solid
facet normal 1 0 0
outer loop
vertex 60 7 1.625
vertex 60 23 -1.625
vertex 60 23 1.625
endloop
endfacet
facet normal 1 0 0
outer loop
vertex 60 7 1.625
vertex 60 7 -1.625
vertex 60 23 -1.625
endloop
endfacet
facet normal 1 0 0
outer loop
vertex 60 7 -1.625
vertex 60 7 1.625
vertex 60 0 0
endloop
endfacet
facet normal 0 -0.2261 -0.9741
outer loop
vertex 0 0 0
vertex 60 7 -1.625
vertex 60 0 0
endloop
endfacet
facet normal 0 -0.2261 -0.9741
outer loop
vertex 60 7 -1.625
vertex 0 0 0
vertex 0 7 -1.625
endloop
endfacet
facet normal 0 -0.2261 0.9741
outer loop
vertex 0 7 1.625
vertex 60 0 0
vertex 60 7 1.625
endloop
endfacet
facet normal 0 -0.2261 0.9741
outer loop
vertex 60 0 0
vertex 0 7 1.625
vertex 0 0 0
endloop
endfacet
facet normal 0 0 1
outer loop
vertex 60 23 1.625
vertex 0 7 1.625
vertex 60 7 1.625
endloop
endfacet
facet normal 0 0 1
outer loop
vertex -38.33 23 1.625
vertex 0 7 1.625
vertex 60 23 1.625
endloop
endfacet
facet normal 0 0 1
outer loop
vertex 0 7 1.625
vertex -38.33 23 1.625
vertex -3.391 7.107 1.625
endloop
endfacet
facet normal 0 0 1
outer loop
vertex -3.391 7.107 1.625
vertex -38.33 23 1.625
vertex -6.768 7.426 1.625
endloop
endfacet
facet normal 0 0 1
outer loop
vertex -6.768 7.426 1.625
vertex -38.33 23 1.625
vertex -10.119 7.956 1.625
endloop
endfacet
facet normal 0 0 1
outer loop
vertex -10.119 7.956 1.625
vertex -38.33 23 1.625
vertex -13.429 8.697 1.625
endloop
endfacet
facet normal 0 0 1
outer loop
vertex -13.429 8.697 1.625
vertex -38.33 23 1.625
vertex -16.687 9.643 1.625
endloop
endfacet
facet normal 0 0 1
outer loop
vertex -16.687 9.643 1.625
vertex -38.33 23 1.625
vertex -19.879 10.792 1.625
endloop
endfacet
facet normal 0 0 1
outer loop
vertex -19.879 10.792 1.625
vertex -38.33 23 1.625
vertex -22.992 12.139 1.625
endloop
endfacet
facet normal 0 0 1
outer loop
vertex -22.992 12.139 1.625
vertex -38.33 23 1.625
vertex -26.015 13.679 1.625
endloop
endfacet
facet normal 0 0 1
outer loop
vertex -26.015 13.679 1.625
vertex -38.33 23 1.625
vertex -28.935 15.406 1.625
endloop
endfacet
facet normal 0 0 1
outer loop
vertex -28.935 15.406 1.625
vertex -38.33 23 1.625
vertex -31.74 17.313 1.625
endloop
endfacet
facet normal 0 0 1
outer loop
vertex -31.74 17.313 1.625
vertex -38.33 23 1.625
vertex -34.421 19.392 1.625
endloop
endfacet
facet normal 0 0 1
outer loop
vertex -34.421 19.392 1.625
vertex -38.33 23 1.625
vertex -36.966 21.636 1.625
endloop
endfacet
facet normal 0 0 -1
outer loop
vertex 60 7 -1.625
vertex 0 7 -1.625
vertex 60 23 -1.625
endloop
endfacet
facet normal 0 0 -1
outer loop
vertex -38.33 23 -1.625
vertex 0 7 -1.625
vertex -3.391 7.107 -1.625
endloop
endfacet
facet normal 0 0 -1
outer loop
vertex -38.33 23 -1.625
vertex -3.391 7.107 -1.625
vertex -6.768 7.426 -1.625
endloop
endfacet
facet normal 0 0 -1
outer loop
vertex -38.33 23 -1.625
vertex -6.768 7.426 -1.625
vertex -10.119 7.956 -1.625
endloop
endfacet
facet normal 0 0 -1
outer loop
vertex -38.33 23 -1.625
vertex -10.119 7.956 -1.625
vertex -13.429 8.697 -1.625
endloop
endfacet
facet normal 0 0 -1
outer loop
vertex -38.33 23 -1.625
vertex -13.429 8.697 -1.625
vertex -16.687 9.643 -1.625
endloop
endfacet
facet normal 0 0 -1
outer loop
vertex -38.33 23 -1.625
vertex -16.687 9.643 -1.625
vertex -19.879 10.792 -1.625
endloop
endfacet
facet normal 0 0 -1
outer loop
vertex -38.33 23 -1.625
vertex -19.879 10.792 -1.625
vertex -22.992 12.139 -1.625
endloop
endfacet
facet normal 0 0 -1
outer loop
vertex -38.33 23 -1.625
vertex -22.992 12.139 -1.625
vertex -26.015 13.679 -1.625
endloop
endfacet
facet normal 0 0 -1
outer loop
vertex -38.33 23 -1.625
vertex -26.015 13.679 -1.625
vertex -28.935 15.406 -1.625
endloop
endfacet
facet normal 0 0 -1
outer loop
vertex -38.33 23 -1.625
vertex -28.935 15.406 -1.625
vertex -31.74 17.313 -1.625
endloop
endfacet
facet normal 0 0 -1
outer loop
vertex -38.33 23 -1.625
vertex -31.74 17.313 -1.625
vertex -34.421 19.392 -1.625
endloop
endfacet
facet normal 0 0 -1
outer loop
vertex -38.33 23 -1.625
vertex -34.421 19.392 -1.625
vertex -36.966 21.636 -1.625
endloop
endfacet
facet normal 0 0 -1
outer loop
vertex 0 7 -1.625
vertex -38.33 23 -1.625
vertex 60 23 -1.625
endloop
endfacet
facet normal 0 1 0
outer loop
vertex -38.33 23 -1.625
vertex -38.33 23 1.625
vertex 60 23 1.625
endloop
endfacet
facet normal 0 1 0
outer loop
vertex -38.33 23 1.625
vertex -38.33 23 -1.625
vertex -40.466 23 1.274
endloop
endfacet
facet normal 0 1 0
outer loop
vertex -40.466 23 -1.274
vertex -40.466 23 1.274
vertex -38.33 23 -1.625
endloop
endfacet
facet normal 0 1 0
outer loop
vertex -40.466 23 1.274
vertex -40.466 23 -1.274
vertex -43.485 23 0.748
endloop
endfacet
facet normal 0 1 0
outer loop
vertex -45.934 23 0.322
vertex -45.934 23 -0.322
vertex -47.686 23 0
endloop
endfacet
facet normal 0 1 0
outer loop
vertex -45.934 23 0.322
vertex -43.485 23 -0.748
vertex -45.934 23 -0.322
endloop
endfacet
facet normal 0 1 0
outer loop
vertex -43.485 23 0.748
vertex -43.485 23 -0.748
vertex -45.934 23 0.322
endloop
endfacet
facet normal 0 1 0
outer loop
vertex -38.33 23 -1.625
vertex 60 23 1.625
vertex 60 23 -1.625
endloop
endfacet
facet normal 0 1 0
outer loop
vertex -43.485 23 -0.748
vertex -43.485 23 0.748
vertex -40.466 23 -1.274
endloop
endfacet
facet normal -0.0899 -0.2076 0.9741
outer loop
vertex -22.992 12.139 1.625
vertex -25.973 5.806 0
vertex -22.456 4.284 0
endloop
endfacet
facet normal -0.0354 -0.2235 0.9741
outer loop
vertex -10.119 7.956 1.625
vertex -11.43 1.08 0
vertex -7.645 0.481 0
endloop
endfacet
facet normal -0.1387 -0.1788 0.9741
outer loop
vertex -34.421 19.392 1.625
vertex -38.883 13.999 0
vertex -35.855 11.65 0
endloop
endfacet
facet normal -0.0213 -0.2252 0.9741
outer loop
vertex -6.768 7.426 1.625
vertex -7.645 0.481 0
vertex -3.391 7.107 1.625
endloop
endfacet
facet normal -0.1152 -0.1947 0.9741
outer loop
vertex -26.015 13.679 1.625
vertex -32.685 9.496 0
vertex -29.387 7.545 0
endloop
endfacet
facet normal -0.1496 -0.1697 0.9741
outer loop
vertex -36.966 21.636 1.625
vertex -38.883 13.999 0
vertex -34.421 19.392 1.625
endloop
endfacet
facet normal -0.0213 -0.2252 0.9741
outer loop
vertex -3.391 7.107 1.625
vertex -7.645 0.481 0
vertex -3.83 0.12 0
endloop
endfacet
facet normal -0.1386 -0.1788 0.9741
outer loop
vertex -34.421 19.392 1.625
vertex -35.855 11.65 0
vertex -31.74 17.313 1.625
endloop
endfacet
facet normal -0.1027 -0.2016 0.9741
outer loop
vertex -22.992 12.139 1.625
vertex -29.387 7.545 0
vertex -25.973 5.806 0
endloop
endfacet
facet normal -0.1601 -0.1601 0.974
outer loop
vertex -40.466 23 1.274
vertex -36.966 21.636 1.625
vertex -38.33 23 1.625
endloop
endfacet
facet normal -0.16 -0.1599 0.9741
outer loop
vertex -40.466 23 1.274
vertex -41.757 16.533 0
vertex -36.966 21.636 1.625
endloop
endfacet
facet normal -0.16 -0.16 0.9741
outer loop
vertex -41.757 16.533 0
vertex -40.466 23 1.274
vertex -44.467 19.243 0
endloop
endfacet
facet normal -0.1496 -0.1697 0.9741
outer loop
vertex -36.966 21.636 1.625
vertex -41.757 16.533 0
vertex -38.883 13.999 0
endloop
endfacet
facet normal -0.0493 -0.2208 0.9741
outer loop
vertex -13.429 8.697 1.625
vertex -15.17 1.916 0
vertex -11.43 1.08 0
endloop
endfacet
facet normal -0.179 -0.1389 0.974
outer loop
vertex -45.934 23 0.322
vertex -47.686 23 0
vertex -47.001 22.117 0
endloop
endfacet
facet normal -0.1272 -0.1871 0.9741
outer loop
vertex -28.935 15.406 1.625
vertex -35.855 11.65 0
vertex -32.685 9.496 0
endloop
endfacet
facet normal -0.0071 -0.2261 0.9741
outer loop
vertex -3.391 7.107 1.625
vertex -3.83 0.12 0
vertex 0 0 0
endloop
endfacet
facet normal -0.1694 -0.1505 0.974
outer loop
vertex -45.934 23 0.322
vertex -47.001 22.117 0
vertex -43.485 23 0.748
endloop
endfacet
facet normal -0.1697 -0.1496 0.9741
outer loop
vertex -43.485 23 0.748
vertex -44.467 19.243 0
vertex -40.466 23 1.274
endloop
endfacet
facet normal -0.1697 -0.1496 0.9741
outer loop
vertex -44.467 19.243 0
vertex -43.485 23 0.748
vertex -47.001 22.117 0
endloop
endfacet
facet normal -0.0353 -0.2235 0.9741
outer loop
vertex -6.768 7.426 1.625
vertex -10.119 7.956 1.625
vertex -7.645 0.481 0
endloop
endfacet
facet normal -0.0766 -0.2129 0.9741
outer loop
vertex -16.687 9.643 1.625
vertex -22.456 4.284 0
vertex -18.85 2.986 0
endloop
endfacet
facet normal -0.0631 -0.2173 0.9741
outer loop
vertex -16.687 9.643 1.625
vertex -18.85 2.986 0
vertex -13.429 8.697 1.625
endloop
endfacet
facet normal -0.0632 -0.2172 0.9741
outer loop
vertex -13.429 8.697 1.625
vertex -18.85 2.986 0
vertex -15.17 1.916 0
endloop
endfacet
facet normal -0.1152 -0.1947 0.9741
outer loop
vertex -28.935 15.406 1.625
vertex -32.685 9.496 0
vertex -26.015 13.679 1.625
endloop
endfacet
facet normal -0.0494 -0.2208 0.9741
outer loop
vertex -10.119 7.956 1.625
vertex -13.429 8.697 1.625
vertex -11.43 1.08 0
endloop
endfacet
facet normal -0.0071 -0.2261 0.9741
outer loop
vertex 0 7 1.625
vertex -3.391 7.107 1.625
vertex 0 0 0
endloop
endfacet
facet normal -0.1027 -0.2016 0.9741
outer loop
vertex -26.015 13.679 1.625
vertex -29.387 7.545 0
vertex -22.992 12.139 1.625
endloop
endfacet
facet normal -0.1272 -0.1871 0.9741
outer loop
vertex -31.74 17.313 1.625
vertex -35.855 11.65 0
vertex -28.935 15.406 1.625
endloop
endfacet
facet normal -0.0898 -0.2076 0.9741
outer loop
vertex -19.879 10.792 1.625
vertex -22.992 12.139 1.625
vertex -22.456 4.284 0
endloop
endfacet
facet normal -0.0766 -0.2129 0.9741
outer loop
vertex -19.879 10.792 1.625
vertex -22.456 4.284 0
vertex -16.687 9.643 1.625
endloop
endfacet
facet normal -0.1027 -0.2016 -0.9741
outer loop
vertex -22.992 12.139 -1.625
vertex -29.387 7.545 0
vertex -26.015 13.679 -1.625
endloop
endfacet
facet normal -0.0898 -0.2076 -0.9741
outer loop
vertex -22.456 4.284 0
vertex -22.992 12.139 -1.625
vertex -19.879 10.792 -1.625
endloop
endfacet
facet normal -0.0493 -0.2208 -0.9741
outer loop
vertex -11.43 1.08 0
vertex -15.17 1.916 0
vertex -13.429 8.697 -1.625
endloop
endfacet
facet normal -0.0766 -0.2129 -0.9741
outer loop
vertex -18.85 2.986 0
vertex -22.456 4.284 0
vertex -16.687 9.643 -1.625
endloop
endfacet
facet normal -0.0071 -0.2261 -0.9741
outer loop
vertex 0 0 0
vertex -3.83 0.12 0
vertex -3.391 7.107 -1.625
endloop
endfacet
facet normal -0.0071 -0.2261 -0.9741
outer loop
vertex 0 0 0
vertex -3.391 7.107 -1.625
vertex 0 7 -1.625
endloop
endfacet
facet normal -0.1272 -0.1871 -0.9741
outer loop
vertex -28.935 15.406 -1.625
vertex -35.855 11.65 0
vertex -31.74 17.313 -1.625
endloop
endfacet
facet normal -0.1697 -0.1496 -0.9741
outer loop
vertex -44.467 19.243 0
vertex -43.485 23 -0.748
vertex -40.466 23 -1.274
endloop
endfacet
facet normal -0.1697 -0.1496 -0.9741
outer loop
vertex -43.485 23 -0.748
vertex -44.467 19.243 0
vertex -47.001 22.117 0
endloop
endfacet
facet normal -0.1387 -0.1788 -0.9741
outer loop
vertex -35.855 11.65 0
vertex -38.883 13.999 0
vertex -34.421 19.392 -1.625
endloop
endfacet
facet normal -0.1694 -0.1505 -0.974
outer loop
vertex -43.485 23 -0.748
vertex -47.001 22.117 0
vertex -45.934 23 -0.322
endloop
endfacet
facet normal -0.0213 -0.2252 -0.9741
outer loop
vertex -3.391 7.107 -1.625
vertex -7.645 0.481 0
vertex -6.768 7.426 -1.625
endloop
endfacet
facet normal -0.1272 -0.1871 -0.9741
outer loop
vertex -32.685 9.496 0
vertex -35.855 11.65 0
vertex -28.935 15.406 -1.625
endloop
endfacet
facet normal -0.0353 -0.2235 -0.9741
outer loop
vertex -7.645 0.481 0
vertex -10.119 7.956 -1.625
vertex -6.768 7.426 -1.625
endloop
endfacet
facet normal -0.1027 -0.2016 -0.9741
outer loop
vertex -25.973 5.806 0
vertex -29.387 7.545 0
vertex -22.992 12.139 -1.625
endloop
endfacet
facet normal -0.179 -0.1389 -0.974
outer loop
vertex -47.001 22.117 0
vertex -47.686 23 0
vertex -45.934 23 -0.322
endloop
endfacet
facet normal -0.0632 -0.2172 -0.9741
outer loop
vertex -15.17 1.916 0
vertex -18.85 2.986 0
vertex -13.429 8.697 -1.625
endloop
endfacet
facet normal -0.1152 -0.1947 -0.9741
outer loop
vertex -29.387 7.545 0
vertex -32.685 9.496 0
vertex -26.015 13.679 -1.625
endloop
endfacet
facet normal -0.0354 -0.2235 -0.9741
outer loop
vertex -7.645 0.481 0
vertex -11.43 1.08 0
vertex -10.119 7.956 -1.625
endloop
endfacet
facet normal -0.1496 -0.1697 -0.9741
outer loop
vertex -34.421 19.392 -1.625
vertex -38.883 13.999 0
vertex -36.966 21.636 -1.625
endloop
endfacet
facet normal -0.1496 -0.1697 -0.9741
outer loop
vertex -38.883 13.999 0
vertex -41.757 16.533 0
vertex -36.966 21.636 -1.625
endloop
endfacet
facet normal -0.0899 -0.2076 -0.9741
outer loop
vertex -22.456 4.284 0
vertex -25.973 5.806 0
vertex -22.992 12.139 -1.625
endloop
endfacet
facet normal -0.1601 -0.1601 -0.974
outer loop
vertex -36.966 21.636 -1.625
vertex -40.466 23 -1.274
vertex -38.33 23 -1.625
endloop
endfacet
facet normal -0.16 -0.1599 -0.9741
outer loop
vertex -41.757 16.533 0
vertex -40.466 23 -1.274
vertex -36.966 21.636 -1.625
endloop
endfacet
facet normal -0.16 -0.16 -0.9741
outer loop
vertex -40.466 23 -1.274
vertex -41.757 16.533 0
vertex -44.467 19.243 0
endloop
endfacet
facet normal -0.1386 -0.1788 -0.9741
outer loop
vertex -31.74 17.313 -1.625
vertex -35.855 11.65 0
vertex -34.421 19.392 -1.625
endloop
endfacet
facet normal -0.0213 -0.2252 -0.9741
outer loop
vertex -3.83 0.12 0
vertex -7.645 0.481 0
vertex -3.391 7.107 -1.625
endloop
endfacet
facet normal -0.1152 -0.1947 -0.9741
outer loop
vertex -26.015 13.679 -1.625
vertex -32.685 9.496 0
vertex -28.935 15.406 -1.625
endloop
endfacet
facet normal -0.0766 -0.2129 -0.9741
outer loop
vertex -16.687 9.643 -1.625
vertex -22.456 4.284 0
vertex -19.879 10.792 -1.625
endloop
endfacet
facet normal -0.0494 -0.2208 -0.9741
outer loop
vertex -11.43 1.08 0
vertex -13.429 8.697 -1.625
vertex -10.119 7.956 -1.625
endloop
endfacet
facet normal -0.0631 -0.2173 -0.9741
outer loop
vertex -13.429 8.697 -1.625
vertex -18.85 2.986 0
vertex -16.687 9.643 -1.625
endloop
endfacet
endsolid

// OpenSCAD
$fn = 100;
difference() {
    translate([0,0,-1.625]) cube([60,23,3.25]);
    union(){
        translate([60,0,0]) rotate([13.07,180,0])  cube([60,23,3.25]);
        rotate([13.07,0,0]) cube([60,23,3.25]);
    }
}
intersection() {
    translate([-50,0,-1.625]) cube([100,23,3.25]);
    union() {
        translate([0,61,0]) cylinder(h = 1.625, r1 = 61, r2 = 54, center = false);
        translate([0,61,-1.625]) cylinder(h = 1.625, r1 = 54, r2 = 61, center =false);
    }
}
